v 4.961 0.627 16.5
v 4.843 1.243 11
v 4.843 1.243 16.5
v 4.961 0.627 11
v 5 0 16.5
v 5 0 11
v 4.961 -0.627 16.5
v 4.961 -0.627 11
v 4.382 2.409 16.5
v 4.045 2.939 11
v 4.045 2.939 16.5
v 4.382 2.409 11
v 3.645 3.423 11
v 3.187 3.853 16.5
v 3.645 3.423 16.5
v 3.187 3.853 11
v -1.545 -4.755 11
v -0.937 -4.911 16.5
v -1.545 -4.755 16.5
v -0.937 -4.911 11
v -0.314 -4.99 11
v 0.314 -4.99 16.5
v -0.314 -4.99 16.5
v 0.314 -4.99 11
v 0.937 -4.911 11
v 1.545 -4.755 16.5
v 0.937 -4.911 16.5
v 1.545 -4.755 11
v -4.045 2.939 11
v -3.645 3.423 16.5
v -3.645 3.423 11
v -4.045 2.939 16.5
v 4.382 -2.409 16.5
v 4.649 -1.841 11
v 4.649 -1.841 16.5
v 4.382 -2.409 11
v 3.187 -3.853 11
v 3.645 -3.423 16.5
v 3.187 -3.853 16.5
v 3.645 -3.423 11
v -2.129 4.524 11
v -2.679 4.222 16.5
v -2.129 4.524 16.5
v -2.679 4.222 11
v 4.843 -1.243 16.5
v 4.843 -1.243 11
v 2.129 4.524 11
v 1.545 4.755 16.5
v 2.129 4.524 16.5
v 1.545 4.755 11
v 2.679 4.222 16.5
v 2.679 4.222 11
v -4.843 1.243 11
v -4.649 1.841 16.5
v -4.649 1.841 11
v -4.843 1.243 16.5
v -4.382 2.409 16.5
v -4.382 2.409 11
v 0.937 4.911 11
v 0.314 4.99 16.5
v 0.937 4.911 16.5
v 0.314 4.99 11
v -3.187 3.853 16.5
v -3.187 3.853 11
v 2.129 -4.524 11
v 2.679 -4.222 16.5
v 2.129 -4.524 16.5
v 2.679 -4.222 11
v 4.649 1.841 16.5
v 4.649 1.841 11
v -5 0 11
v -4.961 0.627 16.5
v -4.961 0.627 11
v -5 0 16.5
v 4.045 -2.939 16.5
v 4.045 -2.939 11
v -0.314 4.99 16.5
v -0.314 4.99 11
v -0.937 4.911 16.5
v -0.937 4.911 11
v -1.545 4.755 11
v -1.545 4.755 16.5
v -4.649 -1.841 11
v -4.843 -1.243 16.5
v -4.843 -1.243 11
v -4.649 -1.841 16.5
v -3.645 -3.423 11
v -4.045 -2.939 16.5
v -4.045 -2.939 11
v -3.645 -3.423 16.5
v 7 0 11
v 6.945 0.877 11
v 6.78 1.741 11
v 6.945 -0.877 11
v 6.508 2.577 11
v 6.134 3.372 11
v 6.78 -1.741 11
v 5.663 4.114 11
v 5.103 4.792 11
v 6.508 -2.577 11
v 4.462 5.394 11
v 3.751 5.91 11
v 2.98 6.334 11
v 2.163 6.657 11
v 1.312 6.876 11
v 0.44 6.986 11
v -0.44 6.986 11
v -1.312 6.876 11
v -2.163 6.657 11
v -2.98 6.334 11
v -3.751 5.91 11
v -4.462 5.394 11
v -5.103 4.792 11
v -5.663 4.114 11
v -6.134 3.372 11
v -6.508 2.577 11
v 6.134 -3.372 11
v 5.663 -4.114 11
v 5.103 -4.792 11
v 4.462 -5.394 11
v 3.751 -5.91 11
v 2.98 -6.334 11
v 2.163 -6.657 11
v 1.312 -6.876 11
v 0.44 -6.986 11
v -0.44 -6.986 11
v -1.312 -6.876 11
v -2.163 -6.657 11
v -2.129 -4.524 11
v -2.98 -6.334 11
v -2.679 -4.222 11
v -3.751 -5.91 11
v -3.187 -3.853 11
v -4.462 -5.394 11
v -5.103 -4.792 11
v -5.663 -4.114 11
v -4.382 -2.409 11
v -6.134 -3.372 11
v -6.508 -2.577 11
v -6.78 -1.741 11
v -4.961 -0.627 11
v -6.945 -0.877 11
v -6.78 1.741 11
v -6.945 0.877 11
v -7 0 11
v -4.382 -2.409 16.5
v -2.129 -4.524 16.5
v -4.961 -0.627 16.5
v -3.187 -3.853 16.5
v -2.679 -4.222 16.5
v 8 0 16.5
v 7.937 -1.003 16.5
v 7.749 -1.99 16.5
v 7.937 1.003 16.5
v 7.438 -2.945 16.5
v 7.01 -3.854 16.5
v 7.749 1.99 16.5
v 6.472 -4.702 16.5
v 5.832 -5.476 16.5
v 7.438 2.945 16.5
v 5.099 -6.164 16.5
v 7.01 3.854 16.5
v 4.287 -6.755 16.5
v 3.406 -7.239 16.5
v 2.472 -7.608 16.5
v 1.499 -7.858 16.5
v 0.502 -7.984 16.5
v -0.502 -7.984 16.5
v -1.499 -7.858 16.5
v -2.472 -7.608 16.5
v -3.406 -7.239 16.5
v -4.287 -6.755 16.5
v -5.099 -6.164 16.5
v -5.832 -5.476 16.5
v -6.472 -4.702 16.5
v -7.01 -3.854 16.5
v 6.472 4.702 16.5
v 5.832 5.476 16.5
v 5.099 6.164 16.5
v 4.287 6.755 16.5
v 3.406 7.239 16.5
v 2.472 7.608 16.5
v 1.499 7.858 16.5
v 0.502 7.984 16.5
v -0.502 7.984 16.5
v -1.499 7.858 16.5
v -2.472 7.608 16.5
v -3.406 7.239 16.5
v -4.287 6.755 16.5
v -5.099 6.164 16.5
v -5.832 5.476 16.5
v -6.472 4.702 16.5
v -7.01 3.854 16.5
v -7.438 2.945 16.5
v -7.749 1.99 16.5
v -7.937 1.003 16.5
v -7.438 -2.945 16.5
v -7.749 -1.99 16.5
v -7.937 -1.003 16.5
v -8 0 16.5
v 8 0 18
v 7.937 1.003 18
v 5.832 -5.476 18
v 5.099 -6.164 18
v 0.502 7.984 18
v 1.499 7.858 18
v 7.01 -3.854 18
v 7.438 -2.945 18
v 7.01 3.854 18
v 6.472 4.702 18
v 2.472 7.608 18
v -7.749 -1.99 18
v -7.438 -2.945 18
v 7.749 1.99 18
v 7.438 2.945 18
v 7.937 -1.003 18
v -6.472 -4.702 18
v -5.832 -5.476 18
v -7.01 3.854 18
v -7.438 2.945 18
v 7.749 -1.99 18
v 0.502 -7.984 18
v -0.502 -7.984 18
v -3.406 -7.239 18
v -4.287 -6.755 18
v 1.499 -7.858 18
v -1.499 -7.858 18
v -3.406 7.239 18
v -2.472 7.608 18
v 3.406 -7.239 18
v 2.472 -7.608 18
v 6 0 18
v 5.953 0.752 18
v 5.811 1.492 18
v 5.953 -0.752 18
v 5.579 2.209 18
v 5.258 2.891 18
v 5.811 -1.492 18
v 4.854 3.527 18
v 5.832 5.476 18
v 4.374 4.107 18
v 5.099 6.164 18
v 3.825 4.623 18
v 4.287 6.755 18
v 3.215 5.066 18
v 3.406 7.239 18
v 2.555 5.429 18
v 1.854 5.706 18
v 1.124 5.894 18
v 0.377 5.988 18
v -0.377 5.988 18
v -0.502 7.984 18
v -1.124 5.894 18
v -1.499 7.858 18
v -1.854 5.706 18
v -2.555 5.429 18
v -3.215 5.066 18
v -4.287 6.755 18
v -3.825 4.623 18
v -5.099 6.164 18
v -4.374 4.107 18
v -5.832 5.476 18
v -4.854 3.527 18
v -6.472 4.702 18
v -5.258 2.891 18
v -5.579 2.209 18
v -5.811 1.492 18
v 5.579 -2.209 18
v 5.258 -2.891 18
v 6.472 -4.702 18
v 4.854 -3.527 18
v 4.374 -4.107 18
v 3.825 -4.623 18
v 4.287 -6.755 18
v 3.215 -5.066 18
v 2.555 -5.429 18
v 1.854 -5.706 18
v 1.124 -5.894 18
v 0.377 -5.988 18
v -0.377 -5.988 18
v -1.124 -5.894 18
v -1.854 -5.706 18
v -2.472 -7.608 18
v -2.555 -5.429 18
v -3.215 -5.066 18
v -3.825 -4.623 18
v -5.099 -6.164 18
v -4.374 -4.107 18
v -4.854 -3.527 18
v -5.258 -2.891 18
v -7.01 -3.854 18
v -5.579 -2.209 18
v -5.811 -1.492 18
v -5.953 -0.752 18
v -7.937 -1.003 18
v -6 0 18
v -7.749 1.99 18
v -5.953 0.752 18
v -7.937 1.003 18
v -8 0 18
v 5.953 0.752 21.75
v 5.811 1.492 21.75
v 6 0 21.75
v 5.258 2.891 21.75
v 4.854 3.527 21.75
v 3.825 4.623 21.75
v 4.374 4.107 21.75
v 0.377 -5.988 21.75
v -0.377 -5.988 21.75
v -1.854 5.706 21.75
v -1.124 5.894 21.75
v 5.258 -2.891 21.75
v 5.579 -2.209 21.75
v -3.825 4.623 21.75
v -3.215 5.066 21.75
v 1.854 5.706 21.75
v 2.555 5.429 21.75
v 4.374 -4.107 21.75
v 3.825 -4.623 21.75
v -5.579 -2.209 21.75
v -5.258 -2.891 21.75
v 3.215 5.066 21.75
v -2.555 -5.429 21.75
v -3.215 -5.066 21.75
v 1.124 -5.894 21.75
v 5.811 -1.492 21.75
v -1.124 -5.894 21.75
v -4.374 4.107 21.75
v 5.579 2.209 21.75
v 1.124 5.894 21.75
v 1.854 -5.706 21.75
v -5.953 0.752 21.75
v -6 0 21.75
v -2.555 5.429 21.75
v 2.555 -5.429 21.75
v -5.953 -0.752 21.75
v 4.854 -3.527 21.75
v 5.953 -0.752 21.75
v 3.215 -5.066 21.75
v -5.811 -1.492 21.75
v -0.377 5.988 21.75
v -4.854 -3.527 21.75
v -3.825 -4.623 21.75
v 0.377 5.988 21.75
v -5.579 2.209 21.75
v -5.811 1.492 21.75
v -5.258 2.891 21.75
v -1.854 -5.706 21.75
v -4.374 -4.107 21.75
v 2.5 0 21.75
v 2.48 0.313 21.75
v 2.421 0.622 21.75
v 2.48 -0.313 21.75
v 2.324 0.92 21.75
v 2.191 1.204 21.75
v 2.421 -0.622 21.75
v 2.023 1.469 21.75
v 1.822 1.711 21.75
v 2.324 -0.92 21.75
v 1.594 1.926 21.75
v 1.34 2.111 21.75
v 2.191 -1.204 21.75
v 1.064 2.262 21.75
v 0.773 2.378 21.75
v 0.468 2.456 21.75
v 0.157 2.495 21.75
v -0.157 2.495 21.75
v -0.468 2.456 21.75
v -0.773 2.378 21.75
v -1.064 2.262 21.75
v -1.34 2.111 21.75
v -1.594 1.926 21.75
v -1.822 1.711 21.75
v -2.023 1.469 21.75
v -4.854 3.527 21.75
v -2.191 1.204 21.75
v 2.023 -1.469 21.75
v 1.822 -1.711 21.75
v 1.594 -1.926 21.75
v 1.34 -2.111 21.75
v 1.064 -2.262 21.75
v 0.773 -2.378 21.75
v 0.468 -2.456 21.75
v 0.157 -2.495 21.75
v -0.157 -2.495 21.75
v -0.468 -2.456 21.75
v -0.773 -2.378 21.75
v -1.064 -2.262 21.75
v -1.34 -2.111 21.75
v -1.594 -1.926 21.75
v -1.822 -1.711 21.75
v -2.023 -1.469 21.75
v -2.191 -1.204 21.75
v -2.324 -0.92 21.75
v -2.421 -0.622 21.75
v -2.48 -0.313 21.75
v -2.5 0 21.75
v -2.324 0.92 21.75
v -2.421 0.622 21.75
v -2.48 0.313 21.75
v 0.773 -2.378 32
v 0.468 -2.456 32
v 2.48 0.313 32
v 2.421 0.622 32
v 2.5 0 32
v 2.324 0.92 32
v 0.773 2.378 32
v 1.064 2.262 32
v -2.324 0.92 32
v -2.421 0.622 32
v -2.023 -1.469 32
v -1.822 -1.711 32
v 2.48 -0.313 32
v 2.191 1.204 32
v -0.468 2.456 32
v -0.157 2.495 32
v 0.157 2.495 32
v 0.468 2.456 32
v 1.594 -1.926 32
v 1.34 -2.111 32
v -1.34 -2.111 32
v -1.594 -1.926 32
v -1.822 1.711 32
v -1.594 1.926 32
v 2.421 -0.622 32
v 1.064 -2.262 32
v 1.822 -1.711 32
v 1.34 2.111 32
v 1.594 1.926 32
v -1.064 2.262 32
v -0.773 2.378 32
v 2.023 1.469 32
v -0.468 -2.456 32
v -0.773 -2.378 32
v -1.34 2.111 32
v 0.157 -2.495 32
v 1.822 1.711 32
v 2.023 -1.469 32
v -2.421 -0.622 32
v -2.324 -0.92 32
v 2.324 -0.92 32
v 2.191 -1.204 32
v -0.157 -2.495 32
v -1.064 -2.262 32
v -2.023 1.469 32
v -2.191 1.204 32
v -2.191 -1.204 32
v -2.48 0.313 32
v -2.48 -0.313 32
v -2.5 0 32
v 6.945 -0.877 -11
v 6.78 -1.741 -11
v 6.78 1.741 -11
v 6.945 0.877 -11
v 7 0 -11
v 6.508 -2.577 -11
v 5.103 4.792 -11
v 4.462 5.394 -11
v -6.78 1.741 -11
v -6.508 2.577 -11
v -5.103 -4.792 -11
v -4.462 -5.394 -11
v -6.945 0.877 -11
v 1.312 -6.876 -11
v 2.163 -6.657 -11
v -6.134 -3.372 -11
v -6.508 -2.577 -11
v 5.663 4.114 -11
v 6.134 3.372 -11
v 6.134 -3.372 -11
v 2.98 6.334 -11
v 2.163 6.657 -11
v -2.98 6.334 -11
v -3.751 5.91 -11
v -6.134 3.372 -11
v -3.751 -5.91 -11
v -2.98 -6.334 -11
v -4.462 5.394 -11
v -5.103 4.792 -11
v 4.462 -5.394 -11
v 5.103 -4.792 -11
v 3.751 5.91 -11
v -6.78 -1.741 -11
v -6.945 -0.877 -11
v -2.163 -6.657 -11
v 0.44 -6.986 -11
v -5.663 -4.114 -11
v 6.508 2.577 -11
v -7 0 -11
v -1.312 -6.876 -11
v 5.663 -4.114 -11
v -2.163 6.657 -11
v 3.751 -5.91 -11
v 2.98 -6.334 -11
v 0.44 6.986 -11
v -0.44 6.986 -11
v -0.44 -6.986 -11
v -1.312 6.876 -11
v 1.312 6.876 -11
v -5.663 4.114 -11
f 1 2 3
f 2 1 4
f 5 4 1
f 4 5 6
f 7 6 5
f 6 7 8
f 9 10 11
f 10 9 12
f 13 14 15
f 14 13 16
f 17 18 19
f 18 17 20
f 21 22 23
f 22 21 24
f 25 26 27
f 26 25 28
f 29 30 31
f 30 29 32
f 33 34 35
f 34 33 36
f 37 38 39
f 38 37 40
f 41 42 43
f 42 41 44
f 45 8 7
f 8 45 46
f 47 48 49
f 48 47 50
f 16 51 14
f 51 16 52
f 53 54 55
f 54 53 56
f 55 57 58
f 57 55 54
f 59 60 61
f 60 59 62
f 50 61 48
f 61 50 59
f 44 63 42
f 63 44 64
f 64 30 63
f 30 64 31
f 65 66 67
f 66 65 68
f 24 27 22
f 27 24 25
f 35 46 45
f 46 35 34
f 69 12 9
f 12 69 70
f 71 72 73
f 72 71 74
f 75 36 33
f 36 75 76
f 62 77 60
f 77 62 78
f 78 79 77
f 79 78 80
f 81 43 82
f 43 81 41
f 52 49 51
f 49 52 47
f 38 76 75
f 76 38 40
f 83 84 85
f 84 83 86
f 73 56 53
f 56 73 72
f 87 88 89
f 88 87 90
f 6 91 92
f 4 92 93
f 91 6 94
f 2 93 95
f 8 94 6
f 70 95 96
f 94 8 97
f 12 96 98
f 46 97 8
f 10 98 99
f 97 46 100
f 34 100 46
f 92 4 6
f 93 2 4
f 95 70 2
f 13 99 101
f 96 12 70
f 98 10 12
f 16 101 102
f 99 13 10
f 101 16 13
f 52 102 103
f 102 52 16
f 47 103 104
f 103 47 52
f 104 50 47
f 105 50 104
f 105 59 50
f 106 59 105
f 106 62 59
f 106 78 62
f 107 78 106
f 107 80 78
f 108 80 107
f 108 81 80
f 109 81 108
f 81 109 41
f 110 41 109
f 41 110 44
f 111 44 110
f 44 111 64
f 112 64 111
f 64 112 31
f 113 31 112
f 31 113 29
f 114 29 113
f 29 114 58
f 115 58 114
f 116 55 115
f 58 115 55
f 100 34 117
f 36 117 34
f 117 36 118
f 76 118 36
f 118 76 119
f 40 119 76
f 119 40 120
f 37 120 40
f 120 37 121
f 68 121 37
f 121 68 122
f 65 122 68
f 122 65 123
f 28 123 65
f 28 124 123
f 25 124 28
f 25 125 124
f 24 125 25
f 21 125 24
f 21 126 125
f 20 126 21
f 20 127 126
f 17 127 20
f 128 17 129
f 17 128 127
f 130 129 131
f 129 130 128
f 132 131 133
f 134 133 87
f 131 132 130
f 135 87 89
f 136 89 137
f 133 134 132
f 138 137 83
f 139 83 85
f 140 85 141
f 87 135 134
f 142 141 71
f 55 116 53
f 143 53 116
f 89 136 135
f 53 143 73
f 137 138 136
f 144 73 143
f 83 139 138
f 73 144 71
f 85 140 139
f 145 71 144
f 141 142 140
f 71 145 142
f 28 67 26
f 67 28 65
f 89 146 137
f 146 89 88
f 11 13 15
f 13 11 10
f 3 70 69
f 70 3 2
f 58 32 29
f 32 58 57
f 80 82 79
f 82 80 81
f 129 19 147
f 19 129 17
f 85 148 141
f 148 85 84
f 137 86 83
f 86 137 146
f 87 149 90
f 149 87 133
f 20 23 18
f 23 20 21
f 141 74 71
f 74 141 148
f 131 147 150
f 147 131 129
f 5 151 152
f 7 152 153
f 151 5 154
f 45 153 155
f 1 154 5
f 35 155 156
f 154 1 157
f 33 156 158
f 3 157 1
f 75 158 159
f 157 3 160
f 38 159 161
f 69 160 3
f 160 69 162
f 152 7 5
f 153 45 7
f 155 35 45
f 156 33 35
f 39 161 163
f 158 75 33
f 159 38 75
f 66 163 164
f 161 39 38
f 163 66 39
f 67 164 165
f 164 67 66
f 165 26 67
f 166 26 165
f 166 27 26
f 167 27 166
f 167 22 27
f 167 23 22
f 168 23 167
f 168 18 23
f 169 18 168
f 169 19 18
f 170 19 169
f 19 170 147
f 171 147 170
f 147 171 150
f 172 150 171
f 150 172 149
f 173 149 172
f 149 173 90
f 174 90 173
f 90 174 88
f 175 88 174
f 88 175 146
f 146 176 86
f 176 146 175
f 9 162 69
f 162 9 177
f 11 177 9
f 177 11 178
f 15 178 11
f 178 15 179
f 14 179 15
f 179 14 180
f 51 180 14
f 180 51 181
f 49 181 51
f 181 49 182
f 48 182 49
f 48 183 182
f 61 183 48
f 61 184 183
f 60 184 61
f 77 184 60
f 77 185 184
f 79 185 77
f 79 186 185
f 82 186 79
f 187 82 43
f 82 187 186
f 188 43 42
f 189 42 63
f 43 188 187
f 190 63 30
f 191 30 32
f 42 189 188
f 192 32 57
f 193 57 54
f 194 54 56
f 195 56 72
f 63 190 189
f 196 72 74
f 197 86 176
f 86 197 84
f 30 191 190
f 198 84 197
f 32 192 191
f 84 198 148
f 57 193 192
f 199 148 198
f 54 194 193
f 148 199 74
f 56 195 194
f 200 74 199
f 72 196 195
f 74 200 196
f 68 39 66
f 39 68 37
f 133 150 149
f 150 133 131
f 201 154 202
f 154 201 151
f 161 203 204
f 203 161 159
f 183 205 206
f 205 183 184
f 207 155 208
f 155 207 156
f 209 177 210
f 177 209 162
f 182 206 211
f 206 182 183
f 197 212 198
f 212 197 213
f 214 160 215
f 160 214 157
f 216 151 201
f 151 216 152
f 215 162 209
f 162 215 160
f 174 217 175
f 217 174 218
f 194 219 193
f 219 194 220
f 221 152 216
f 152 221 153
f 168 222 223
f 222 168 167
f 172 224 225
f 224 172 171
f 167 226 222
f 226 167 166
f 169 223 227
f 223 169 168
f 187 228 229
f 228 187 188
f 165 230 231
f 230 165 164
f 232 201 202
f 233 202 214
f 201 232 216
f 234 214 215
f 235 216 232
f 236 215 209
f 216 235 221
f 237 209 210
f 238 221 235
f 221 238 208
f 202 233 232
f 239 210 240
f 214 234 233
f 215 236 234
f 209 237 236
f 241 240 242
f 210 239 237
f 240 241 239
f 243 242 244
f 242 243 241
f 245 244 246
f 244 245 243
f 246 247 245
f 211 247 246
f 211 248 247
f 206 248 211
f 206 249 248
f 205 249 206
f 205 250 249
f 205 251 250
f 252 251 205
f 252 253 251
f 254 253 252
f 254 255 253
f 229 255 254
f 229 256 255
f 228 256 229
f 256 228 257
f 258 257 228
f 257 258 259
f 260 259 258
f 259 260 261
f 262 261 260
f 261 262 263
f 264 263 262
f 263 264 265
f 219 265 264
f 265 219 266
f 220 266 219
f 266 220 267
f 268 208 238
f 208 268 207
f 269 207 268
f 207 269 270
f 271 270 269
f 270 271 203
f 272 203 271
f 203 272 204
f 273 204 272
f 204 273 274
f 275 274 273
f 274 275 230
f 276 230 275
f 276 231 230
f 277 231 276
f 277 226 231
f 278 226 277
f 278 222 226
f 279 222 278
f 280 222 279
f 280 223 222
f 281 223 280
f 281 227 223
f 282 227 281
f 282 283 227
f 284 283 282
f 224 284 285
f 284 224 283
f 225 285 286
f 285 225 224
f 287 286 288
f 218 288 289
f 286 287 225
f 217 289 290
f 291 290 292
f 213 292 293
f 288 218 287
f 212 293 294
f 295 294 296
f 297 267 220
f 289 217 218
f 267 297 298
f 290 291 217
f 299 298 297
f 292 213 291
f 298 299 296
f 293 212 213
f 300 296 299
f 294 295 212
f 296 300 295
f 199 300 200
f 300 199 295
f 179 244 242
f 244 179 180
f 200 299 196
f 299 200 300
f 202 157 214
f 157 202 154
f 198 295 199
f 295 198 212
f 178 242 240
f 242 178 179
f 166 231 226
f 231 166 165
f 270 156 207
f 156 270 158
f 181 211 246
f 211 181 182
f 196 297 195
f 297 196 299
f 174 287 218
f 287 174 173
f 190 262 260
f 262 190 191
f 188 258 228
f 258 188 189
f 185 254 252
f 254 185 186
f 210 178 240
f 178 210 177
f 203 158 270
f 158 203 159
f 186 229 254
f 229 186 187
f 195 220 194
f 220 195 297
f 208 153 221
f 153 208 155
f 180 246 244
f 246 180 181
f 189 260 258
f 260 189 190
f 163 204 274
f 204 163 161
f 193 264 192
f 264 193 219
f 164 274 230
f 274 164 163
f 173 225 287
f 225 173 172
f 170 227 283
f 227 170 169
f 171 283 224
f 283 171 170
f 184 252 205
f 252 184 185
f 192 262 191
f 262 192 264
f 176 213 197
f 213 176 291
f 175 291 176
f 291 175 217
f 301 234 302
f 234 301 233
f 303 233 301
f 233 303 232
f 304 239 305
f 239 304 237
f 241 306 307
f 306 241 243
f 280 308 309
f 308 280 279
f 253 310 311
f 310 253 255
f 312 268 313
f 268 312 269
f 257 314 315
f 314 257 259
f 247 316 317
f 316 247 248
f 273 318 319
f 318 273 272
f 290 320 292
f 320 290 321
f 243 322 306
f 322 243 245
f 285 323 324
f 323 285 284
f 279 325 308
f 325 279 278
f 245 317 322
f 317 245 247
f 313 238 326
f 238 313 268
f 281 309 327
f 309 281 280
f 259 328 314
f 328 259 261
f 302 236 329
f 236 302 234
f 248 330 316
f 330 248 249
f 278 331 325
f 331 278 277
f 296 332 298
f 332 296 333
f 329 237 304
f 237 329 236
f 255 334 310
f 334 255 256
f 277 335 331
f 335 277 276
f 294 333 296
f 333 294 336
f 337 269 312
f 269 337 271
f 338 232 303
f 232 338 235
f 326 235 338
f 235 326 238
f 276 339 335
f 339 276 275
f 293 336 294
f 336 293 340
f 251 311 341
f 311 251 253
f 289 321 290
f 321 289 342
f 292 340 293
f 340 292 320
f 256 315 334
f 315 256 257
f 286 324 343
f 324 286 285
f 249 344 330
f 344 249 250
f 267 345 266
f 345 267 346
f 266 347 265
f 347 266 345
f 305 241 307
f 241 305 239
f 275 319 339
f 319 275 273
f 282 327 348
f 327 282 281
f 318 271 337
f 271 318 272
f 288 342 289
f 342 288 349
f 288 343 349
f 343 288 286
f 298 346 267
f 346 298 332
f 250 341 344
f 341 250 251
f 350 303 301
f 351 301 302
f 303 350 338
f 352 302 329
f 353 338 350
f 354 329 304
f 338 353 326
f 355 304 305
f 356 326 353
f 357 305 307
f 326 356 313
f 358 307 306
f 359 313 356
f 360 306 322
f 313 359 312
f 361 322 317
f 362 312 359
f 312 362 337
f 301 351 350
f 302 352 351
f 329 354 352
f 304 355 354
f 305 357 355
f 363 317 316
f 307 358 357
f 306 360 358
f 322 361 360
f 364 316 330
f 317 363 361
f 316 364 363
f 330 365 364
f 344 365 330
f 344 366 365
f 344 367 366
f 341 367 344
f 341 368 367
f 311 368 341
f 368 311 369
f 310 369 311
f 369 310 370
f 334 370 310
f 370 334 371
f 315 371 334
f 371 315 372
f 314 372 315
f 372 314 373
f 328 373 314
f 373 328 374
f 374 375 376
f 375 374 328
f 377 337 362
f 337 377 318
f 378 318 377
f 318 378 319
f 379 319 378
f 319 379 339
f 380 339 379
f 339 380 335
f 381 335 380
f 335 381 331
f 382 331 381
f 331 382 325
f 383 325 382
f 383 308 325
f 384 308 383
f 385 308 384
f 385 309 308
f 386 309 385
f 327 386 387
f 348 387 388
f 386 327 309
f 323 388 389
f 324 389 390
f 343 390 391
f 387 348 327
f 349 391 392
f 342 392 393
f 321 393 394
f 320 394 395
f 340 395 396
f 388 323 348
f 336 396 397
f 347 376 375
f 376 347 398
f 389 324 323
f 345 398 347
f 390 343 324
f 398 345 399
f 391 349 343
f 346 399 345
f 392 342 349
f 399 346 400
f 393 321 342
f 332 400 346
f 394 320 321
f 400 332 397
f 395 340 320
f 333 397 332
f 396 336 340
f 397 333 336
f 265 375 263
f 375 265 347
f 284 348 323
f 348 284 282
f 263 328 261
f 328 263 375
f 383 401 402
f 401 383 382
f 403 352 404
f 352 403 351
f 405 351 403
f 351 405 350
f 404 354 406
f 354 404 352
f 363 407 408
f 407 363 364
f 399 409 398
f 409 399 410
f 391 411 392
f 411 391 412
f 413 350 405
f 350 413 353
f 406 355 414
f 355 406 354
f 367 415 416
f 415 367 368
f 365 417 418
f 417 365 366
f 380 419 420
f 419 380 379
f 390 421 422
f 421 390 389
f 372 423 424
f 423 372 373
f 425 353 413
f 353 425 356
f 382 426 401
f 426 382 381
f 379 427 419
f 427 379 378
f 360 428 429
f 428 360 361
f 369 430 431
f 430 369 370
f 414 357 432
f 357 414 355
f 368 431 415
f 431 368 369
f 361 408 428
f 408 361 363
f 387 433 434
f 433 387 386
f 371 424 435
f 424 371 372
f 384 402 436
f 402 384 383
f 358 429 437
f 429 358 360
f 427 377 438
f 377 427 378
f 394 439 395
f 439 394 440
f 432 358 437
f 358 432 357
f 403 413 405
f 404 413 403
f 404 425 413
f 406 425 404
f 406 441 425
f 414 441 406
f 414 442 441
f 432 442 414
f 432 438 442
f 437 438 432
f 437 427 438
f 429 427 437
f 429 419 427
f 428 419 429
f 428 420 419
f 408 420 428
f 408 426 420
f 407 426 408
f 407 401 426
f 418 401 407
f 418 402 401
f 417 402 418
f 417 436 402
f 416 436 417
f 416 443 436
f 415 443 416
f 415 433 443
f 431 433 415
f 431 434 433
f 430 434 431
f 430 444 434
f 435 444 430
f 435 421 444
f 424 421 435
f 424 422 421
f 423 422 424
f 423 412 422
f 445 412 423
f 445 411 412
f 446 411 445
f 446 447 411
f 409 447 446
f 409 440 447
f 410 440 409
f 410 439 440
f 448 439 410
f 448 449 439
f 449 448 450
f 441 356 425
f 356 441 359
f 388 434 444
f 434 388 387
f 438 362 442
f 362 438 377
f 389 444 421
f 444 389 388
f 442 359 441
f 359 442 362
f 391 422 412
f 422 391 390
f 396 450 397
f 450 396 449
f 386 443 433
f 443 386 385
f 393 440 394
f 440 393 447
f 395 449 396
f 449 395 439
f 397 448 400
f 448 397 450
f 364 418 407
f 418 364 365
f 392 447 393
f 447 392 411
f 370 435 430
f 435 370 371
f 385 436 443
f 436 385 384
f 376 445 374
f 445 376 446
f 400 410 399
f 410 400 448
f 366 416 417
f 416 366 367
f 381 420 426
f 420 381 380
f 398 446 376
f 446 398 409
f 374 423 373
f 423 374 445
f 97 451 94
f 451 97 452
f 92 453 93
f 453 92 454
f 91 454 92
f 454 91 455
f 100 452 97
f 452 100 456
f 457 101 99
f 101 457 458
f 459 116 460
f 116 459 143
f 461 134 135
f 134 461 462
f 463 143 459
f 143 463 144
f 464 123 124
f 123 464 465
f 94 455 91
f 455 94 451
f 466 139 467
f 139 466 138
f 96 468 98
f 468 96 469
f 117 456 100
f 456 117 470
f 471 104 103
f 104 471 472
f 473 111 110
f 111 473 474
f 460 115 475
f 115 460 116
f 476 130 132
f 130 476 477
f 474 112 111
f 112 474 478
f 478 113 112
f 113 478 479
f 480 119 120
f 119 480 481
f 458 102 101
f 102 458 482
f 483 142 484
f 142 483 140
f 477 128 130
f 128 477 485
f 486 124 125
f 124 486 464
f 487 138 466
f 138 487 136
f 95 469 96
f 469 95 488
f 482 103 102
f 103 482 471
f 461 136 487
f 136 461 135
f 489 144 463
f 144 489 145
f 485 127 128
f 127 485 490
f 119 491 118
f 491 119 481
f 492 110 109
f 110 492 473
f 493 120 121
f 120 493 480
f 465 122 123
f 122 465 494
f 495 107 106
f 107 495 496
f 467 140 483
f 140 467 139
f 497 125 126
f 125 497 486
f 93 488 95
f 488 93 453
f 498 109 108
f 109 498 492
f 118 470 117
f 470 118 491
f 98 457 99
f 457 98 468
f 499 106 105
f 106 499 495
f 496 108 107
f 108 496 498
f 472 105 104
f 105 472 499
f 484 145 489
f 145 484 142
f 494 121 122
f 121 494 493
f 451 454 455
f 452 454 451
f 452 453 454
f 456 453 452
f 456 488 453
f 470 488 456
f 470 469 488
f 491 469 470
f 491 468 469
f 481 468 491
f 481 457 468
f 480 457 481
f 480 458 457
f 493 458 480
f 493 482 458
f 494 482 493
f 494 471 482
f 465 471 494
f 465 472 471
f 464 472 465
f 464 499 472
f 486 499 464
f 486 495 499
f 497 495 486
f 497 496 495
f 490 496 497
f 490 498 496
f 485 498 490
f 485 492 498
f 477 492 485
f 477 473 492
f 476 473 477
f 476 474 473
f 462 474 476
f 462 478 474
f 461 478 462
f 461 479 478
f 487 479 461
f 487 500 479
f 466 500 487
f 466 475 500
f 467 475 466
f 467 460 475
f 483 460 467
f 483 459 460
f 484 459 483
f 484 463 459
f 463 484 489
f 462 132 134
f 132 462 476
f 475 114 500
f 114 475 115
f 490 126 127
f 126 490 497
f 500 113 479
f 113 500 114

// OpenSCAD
/********************************************************
This file is part of the RepRapPNP project, developed at the University of Hamburg.
Author: Daniel Ahlers <2ahlers@informatik.uni-hamburg.de> 
License: 'GNU Affero General Public License AGPLv3 http://www.gnu.org/licenses/agpl.html' 
*******************************************************/

// general object resolution
$fn = 50;

cylinder(22,r=14/2,center=true);
translate([0,0,22/2+5.5/2])  {
    cylinder(5.5,r=10/2,center=true);
    translate([0,0,5.5/2+1.5/2]) cylinder(1.5,r=16/2,center=true);
    translate([0,0,5.5/2+1.5/2+4.5/2]) cylinder(4.5,r=12/2,center=true);
    translate([0,0,5.5/2+1.5/2+4.5/2+12.5/2]) cylinder(12.5,r=5/2,center=true);
}
